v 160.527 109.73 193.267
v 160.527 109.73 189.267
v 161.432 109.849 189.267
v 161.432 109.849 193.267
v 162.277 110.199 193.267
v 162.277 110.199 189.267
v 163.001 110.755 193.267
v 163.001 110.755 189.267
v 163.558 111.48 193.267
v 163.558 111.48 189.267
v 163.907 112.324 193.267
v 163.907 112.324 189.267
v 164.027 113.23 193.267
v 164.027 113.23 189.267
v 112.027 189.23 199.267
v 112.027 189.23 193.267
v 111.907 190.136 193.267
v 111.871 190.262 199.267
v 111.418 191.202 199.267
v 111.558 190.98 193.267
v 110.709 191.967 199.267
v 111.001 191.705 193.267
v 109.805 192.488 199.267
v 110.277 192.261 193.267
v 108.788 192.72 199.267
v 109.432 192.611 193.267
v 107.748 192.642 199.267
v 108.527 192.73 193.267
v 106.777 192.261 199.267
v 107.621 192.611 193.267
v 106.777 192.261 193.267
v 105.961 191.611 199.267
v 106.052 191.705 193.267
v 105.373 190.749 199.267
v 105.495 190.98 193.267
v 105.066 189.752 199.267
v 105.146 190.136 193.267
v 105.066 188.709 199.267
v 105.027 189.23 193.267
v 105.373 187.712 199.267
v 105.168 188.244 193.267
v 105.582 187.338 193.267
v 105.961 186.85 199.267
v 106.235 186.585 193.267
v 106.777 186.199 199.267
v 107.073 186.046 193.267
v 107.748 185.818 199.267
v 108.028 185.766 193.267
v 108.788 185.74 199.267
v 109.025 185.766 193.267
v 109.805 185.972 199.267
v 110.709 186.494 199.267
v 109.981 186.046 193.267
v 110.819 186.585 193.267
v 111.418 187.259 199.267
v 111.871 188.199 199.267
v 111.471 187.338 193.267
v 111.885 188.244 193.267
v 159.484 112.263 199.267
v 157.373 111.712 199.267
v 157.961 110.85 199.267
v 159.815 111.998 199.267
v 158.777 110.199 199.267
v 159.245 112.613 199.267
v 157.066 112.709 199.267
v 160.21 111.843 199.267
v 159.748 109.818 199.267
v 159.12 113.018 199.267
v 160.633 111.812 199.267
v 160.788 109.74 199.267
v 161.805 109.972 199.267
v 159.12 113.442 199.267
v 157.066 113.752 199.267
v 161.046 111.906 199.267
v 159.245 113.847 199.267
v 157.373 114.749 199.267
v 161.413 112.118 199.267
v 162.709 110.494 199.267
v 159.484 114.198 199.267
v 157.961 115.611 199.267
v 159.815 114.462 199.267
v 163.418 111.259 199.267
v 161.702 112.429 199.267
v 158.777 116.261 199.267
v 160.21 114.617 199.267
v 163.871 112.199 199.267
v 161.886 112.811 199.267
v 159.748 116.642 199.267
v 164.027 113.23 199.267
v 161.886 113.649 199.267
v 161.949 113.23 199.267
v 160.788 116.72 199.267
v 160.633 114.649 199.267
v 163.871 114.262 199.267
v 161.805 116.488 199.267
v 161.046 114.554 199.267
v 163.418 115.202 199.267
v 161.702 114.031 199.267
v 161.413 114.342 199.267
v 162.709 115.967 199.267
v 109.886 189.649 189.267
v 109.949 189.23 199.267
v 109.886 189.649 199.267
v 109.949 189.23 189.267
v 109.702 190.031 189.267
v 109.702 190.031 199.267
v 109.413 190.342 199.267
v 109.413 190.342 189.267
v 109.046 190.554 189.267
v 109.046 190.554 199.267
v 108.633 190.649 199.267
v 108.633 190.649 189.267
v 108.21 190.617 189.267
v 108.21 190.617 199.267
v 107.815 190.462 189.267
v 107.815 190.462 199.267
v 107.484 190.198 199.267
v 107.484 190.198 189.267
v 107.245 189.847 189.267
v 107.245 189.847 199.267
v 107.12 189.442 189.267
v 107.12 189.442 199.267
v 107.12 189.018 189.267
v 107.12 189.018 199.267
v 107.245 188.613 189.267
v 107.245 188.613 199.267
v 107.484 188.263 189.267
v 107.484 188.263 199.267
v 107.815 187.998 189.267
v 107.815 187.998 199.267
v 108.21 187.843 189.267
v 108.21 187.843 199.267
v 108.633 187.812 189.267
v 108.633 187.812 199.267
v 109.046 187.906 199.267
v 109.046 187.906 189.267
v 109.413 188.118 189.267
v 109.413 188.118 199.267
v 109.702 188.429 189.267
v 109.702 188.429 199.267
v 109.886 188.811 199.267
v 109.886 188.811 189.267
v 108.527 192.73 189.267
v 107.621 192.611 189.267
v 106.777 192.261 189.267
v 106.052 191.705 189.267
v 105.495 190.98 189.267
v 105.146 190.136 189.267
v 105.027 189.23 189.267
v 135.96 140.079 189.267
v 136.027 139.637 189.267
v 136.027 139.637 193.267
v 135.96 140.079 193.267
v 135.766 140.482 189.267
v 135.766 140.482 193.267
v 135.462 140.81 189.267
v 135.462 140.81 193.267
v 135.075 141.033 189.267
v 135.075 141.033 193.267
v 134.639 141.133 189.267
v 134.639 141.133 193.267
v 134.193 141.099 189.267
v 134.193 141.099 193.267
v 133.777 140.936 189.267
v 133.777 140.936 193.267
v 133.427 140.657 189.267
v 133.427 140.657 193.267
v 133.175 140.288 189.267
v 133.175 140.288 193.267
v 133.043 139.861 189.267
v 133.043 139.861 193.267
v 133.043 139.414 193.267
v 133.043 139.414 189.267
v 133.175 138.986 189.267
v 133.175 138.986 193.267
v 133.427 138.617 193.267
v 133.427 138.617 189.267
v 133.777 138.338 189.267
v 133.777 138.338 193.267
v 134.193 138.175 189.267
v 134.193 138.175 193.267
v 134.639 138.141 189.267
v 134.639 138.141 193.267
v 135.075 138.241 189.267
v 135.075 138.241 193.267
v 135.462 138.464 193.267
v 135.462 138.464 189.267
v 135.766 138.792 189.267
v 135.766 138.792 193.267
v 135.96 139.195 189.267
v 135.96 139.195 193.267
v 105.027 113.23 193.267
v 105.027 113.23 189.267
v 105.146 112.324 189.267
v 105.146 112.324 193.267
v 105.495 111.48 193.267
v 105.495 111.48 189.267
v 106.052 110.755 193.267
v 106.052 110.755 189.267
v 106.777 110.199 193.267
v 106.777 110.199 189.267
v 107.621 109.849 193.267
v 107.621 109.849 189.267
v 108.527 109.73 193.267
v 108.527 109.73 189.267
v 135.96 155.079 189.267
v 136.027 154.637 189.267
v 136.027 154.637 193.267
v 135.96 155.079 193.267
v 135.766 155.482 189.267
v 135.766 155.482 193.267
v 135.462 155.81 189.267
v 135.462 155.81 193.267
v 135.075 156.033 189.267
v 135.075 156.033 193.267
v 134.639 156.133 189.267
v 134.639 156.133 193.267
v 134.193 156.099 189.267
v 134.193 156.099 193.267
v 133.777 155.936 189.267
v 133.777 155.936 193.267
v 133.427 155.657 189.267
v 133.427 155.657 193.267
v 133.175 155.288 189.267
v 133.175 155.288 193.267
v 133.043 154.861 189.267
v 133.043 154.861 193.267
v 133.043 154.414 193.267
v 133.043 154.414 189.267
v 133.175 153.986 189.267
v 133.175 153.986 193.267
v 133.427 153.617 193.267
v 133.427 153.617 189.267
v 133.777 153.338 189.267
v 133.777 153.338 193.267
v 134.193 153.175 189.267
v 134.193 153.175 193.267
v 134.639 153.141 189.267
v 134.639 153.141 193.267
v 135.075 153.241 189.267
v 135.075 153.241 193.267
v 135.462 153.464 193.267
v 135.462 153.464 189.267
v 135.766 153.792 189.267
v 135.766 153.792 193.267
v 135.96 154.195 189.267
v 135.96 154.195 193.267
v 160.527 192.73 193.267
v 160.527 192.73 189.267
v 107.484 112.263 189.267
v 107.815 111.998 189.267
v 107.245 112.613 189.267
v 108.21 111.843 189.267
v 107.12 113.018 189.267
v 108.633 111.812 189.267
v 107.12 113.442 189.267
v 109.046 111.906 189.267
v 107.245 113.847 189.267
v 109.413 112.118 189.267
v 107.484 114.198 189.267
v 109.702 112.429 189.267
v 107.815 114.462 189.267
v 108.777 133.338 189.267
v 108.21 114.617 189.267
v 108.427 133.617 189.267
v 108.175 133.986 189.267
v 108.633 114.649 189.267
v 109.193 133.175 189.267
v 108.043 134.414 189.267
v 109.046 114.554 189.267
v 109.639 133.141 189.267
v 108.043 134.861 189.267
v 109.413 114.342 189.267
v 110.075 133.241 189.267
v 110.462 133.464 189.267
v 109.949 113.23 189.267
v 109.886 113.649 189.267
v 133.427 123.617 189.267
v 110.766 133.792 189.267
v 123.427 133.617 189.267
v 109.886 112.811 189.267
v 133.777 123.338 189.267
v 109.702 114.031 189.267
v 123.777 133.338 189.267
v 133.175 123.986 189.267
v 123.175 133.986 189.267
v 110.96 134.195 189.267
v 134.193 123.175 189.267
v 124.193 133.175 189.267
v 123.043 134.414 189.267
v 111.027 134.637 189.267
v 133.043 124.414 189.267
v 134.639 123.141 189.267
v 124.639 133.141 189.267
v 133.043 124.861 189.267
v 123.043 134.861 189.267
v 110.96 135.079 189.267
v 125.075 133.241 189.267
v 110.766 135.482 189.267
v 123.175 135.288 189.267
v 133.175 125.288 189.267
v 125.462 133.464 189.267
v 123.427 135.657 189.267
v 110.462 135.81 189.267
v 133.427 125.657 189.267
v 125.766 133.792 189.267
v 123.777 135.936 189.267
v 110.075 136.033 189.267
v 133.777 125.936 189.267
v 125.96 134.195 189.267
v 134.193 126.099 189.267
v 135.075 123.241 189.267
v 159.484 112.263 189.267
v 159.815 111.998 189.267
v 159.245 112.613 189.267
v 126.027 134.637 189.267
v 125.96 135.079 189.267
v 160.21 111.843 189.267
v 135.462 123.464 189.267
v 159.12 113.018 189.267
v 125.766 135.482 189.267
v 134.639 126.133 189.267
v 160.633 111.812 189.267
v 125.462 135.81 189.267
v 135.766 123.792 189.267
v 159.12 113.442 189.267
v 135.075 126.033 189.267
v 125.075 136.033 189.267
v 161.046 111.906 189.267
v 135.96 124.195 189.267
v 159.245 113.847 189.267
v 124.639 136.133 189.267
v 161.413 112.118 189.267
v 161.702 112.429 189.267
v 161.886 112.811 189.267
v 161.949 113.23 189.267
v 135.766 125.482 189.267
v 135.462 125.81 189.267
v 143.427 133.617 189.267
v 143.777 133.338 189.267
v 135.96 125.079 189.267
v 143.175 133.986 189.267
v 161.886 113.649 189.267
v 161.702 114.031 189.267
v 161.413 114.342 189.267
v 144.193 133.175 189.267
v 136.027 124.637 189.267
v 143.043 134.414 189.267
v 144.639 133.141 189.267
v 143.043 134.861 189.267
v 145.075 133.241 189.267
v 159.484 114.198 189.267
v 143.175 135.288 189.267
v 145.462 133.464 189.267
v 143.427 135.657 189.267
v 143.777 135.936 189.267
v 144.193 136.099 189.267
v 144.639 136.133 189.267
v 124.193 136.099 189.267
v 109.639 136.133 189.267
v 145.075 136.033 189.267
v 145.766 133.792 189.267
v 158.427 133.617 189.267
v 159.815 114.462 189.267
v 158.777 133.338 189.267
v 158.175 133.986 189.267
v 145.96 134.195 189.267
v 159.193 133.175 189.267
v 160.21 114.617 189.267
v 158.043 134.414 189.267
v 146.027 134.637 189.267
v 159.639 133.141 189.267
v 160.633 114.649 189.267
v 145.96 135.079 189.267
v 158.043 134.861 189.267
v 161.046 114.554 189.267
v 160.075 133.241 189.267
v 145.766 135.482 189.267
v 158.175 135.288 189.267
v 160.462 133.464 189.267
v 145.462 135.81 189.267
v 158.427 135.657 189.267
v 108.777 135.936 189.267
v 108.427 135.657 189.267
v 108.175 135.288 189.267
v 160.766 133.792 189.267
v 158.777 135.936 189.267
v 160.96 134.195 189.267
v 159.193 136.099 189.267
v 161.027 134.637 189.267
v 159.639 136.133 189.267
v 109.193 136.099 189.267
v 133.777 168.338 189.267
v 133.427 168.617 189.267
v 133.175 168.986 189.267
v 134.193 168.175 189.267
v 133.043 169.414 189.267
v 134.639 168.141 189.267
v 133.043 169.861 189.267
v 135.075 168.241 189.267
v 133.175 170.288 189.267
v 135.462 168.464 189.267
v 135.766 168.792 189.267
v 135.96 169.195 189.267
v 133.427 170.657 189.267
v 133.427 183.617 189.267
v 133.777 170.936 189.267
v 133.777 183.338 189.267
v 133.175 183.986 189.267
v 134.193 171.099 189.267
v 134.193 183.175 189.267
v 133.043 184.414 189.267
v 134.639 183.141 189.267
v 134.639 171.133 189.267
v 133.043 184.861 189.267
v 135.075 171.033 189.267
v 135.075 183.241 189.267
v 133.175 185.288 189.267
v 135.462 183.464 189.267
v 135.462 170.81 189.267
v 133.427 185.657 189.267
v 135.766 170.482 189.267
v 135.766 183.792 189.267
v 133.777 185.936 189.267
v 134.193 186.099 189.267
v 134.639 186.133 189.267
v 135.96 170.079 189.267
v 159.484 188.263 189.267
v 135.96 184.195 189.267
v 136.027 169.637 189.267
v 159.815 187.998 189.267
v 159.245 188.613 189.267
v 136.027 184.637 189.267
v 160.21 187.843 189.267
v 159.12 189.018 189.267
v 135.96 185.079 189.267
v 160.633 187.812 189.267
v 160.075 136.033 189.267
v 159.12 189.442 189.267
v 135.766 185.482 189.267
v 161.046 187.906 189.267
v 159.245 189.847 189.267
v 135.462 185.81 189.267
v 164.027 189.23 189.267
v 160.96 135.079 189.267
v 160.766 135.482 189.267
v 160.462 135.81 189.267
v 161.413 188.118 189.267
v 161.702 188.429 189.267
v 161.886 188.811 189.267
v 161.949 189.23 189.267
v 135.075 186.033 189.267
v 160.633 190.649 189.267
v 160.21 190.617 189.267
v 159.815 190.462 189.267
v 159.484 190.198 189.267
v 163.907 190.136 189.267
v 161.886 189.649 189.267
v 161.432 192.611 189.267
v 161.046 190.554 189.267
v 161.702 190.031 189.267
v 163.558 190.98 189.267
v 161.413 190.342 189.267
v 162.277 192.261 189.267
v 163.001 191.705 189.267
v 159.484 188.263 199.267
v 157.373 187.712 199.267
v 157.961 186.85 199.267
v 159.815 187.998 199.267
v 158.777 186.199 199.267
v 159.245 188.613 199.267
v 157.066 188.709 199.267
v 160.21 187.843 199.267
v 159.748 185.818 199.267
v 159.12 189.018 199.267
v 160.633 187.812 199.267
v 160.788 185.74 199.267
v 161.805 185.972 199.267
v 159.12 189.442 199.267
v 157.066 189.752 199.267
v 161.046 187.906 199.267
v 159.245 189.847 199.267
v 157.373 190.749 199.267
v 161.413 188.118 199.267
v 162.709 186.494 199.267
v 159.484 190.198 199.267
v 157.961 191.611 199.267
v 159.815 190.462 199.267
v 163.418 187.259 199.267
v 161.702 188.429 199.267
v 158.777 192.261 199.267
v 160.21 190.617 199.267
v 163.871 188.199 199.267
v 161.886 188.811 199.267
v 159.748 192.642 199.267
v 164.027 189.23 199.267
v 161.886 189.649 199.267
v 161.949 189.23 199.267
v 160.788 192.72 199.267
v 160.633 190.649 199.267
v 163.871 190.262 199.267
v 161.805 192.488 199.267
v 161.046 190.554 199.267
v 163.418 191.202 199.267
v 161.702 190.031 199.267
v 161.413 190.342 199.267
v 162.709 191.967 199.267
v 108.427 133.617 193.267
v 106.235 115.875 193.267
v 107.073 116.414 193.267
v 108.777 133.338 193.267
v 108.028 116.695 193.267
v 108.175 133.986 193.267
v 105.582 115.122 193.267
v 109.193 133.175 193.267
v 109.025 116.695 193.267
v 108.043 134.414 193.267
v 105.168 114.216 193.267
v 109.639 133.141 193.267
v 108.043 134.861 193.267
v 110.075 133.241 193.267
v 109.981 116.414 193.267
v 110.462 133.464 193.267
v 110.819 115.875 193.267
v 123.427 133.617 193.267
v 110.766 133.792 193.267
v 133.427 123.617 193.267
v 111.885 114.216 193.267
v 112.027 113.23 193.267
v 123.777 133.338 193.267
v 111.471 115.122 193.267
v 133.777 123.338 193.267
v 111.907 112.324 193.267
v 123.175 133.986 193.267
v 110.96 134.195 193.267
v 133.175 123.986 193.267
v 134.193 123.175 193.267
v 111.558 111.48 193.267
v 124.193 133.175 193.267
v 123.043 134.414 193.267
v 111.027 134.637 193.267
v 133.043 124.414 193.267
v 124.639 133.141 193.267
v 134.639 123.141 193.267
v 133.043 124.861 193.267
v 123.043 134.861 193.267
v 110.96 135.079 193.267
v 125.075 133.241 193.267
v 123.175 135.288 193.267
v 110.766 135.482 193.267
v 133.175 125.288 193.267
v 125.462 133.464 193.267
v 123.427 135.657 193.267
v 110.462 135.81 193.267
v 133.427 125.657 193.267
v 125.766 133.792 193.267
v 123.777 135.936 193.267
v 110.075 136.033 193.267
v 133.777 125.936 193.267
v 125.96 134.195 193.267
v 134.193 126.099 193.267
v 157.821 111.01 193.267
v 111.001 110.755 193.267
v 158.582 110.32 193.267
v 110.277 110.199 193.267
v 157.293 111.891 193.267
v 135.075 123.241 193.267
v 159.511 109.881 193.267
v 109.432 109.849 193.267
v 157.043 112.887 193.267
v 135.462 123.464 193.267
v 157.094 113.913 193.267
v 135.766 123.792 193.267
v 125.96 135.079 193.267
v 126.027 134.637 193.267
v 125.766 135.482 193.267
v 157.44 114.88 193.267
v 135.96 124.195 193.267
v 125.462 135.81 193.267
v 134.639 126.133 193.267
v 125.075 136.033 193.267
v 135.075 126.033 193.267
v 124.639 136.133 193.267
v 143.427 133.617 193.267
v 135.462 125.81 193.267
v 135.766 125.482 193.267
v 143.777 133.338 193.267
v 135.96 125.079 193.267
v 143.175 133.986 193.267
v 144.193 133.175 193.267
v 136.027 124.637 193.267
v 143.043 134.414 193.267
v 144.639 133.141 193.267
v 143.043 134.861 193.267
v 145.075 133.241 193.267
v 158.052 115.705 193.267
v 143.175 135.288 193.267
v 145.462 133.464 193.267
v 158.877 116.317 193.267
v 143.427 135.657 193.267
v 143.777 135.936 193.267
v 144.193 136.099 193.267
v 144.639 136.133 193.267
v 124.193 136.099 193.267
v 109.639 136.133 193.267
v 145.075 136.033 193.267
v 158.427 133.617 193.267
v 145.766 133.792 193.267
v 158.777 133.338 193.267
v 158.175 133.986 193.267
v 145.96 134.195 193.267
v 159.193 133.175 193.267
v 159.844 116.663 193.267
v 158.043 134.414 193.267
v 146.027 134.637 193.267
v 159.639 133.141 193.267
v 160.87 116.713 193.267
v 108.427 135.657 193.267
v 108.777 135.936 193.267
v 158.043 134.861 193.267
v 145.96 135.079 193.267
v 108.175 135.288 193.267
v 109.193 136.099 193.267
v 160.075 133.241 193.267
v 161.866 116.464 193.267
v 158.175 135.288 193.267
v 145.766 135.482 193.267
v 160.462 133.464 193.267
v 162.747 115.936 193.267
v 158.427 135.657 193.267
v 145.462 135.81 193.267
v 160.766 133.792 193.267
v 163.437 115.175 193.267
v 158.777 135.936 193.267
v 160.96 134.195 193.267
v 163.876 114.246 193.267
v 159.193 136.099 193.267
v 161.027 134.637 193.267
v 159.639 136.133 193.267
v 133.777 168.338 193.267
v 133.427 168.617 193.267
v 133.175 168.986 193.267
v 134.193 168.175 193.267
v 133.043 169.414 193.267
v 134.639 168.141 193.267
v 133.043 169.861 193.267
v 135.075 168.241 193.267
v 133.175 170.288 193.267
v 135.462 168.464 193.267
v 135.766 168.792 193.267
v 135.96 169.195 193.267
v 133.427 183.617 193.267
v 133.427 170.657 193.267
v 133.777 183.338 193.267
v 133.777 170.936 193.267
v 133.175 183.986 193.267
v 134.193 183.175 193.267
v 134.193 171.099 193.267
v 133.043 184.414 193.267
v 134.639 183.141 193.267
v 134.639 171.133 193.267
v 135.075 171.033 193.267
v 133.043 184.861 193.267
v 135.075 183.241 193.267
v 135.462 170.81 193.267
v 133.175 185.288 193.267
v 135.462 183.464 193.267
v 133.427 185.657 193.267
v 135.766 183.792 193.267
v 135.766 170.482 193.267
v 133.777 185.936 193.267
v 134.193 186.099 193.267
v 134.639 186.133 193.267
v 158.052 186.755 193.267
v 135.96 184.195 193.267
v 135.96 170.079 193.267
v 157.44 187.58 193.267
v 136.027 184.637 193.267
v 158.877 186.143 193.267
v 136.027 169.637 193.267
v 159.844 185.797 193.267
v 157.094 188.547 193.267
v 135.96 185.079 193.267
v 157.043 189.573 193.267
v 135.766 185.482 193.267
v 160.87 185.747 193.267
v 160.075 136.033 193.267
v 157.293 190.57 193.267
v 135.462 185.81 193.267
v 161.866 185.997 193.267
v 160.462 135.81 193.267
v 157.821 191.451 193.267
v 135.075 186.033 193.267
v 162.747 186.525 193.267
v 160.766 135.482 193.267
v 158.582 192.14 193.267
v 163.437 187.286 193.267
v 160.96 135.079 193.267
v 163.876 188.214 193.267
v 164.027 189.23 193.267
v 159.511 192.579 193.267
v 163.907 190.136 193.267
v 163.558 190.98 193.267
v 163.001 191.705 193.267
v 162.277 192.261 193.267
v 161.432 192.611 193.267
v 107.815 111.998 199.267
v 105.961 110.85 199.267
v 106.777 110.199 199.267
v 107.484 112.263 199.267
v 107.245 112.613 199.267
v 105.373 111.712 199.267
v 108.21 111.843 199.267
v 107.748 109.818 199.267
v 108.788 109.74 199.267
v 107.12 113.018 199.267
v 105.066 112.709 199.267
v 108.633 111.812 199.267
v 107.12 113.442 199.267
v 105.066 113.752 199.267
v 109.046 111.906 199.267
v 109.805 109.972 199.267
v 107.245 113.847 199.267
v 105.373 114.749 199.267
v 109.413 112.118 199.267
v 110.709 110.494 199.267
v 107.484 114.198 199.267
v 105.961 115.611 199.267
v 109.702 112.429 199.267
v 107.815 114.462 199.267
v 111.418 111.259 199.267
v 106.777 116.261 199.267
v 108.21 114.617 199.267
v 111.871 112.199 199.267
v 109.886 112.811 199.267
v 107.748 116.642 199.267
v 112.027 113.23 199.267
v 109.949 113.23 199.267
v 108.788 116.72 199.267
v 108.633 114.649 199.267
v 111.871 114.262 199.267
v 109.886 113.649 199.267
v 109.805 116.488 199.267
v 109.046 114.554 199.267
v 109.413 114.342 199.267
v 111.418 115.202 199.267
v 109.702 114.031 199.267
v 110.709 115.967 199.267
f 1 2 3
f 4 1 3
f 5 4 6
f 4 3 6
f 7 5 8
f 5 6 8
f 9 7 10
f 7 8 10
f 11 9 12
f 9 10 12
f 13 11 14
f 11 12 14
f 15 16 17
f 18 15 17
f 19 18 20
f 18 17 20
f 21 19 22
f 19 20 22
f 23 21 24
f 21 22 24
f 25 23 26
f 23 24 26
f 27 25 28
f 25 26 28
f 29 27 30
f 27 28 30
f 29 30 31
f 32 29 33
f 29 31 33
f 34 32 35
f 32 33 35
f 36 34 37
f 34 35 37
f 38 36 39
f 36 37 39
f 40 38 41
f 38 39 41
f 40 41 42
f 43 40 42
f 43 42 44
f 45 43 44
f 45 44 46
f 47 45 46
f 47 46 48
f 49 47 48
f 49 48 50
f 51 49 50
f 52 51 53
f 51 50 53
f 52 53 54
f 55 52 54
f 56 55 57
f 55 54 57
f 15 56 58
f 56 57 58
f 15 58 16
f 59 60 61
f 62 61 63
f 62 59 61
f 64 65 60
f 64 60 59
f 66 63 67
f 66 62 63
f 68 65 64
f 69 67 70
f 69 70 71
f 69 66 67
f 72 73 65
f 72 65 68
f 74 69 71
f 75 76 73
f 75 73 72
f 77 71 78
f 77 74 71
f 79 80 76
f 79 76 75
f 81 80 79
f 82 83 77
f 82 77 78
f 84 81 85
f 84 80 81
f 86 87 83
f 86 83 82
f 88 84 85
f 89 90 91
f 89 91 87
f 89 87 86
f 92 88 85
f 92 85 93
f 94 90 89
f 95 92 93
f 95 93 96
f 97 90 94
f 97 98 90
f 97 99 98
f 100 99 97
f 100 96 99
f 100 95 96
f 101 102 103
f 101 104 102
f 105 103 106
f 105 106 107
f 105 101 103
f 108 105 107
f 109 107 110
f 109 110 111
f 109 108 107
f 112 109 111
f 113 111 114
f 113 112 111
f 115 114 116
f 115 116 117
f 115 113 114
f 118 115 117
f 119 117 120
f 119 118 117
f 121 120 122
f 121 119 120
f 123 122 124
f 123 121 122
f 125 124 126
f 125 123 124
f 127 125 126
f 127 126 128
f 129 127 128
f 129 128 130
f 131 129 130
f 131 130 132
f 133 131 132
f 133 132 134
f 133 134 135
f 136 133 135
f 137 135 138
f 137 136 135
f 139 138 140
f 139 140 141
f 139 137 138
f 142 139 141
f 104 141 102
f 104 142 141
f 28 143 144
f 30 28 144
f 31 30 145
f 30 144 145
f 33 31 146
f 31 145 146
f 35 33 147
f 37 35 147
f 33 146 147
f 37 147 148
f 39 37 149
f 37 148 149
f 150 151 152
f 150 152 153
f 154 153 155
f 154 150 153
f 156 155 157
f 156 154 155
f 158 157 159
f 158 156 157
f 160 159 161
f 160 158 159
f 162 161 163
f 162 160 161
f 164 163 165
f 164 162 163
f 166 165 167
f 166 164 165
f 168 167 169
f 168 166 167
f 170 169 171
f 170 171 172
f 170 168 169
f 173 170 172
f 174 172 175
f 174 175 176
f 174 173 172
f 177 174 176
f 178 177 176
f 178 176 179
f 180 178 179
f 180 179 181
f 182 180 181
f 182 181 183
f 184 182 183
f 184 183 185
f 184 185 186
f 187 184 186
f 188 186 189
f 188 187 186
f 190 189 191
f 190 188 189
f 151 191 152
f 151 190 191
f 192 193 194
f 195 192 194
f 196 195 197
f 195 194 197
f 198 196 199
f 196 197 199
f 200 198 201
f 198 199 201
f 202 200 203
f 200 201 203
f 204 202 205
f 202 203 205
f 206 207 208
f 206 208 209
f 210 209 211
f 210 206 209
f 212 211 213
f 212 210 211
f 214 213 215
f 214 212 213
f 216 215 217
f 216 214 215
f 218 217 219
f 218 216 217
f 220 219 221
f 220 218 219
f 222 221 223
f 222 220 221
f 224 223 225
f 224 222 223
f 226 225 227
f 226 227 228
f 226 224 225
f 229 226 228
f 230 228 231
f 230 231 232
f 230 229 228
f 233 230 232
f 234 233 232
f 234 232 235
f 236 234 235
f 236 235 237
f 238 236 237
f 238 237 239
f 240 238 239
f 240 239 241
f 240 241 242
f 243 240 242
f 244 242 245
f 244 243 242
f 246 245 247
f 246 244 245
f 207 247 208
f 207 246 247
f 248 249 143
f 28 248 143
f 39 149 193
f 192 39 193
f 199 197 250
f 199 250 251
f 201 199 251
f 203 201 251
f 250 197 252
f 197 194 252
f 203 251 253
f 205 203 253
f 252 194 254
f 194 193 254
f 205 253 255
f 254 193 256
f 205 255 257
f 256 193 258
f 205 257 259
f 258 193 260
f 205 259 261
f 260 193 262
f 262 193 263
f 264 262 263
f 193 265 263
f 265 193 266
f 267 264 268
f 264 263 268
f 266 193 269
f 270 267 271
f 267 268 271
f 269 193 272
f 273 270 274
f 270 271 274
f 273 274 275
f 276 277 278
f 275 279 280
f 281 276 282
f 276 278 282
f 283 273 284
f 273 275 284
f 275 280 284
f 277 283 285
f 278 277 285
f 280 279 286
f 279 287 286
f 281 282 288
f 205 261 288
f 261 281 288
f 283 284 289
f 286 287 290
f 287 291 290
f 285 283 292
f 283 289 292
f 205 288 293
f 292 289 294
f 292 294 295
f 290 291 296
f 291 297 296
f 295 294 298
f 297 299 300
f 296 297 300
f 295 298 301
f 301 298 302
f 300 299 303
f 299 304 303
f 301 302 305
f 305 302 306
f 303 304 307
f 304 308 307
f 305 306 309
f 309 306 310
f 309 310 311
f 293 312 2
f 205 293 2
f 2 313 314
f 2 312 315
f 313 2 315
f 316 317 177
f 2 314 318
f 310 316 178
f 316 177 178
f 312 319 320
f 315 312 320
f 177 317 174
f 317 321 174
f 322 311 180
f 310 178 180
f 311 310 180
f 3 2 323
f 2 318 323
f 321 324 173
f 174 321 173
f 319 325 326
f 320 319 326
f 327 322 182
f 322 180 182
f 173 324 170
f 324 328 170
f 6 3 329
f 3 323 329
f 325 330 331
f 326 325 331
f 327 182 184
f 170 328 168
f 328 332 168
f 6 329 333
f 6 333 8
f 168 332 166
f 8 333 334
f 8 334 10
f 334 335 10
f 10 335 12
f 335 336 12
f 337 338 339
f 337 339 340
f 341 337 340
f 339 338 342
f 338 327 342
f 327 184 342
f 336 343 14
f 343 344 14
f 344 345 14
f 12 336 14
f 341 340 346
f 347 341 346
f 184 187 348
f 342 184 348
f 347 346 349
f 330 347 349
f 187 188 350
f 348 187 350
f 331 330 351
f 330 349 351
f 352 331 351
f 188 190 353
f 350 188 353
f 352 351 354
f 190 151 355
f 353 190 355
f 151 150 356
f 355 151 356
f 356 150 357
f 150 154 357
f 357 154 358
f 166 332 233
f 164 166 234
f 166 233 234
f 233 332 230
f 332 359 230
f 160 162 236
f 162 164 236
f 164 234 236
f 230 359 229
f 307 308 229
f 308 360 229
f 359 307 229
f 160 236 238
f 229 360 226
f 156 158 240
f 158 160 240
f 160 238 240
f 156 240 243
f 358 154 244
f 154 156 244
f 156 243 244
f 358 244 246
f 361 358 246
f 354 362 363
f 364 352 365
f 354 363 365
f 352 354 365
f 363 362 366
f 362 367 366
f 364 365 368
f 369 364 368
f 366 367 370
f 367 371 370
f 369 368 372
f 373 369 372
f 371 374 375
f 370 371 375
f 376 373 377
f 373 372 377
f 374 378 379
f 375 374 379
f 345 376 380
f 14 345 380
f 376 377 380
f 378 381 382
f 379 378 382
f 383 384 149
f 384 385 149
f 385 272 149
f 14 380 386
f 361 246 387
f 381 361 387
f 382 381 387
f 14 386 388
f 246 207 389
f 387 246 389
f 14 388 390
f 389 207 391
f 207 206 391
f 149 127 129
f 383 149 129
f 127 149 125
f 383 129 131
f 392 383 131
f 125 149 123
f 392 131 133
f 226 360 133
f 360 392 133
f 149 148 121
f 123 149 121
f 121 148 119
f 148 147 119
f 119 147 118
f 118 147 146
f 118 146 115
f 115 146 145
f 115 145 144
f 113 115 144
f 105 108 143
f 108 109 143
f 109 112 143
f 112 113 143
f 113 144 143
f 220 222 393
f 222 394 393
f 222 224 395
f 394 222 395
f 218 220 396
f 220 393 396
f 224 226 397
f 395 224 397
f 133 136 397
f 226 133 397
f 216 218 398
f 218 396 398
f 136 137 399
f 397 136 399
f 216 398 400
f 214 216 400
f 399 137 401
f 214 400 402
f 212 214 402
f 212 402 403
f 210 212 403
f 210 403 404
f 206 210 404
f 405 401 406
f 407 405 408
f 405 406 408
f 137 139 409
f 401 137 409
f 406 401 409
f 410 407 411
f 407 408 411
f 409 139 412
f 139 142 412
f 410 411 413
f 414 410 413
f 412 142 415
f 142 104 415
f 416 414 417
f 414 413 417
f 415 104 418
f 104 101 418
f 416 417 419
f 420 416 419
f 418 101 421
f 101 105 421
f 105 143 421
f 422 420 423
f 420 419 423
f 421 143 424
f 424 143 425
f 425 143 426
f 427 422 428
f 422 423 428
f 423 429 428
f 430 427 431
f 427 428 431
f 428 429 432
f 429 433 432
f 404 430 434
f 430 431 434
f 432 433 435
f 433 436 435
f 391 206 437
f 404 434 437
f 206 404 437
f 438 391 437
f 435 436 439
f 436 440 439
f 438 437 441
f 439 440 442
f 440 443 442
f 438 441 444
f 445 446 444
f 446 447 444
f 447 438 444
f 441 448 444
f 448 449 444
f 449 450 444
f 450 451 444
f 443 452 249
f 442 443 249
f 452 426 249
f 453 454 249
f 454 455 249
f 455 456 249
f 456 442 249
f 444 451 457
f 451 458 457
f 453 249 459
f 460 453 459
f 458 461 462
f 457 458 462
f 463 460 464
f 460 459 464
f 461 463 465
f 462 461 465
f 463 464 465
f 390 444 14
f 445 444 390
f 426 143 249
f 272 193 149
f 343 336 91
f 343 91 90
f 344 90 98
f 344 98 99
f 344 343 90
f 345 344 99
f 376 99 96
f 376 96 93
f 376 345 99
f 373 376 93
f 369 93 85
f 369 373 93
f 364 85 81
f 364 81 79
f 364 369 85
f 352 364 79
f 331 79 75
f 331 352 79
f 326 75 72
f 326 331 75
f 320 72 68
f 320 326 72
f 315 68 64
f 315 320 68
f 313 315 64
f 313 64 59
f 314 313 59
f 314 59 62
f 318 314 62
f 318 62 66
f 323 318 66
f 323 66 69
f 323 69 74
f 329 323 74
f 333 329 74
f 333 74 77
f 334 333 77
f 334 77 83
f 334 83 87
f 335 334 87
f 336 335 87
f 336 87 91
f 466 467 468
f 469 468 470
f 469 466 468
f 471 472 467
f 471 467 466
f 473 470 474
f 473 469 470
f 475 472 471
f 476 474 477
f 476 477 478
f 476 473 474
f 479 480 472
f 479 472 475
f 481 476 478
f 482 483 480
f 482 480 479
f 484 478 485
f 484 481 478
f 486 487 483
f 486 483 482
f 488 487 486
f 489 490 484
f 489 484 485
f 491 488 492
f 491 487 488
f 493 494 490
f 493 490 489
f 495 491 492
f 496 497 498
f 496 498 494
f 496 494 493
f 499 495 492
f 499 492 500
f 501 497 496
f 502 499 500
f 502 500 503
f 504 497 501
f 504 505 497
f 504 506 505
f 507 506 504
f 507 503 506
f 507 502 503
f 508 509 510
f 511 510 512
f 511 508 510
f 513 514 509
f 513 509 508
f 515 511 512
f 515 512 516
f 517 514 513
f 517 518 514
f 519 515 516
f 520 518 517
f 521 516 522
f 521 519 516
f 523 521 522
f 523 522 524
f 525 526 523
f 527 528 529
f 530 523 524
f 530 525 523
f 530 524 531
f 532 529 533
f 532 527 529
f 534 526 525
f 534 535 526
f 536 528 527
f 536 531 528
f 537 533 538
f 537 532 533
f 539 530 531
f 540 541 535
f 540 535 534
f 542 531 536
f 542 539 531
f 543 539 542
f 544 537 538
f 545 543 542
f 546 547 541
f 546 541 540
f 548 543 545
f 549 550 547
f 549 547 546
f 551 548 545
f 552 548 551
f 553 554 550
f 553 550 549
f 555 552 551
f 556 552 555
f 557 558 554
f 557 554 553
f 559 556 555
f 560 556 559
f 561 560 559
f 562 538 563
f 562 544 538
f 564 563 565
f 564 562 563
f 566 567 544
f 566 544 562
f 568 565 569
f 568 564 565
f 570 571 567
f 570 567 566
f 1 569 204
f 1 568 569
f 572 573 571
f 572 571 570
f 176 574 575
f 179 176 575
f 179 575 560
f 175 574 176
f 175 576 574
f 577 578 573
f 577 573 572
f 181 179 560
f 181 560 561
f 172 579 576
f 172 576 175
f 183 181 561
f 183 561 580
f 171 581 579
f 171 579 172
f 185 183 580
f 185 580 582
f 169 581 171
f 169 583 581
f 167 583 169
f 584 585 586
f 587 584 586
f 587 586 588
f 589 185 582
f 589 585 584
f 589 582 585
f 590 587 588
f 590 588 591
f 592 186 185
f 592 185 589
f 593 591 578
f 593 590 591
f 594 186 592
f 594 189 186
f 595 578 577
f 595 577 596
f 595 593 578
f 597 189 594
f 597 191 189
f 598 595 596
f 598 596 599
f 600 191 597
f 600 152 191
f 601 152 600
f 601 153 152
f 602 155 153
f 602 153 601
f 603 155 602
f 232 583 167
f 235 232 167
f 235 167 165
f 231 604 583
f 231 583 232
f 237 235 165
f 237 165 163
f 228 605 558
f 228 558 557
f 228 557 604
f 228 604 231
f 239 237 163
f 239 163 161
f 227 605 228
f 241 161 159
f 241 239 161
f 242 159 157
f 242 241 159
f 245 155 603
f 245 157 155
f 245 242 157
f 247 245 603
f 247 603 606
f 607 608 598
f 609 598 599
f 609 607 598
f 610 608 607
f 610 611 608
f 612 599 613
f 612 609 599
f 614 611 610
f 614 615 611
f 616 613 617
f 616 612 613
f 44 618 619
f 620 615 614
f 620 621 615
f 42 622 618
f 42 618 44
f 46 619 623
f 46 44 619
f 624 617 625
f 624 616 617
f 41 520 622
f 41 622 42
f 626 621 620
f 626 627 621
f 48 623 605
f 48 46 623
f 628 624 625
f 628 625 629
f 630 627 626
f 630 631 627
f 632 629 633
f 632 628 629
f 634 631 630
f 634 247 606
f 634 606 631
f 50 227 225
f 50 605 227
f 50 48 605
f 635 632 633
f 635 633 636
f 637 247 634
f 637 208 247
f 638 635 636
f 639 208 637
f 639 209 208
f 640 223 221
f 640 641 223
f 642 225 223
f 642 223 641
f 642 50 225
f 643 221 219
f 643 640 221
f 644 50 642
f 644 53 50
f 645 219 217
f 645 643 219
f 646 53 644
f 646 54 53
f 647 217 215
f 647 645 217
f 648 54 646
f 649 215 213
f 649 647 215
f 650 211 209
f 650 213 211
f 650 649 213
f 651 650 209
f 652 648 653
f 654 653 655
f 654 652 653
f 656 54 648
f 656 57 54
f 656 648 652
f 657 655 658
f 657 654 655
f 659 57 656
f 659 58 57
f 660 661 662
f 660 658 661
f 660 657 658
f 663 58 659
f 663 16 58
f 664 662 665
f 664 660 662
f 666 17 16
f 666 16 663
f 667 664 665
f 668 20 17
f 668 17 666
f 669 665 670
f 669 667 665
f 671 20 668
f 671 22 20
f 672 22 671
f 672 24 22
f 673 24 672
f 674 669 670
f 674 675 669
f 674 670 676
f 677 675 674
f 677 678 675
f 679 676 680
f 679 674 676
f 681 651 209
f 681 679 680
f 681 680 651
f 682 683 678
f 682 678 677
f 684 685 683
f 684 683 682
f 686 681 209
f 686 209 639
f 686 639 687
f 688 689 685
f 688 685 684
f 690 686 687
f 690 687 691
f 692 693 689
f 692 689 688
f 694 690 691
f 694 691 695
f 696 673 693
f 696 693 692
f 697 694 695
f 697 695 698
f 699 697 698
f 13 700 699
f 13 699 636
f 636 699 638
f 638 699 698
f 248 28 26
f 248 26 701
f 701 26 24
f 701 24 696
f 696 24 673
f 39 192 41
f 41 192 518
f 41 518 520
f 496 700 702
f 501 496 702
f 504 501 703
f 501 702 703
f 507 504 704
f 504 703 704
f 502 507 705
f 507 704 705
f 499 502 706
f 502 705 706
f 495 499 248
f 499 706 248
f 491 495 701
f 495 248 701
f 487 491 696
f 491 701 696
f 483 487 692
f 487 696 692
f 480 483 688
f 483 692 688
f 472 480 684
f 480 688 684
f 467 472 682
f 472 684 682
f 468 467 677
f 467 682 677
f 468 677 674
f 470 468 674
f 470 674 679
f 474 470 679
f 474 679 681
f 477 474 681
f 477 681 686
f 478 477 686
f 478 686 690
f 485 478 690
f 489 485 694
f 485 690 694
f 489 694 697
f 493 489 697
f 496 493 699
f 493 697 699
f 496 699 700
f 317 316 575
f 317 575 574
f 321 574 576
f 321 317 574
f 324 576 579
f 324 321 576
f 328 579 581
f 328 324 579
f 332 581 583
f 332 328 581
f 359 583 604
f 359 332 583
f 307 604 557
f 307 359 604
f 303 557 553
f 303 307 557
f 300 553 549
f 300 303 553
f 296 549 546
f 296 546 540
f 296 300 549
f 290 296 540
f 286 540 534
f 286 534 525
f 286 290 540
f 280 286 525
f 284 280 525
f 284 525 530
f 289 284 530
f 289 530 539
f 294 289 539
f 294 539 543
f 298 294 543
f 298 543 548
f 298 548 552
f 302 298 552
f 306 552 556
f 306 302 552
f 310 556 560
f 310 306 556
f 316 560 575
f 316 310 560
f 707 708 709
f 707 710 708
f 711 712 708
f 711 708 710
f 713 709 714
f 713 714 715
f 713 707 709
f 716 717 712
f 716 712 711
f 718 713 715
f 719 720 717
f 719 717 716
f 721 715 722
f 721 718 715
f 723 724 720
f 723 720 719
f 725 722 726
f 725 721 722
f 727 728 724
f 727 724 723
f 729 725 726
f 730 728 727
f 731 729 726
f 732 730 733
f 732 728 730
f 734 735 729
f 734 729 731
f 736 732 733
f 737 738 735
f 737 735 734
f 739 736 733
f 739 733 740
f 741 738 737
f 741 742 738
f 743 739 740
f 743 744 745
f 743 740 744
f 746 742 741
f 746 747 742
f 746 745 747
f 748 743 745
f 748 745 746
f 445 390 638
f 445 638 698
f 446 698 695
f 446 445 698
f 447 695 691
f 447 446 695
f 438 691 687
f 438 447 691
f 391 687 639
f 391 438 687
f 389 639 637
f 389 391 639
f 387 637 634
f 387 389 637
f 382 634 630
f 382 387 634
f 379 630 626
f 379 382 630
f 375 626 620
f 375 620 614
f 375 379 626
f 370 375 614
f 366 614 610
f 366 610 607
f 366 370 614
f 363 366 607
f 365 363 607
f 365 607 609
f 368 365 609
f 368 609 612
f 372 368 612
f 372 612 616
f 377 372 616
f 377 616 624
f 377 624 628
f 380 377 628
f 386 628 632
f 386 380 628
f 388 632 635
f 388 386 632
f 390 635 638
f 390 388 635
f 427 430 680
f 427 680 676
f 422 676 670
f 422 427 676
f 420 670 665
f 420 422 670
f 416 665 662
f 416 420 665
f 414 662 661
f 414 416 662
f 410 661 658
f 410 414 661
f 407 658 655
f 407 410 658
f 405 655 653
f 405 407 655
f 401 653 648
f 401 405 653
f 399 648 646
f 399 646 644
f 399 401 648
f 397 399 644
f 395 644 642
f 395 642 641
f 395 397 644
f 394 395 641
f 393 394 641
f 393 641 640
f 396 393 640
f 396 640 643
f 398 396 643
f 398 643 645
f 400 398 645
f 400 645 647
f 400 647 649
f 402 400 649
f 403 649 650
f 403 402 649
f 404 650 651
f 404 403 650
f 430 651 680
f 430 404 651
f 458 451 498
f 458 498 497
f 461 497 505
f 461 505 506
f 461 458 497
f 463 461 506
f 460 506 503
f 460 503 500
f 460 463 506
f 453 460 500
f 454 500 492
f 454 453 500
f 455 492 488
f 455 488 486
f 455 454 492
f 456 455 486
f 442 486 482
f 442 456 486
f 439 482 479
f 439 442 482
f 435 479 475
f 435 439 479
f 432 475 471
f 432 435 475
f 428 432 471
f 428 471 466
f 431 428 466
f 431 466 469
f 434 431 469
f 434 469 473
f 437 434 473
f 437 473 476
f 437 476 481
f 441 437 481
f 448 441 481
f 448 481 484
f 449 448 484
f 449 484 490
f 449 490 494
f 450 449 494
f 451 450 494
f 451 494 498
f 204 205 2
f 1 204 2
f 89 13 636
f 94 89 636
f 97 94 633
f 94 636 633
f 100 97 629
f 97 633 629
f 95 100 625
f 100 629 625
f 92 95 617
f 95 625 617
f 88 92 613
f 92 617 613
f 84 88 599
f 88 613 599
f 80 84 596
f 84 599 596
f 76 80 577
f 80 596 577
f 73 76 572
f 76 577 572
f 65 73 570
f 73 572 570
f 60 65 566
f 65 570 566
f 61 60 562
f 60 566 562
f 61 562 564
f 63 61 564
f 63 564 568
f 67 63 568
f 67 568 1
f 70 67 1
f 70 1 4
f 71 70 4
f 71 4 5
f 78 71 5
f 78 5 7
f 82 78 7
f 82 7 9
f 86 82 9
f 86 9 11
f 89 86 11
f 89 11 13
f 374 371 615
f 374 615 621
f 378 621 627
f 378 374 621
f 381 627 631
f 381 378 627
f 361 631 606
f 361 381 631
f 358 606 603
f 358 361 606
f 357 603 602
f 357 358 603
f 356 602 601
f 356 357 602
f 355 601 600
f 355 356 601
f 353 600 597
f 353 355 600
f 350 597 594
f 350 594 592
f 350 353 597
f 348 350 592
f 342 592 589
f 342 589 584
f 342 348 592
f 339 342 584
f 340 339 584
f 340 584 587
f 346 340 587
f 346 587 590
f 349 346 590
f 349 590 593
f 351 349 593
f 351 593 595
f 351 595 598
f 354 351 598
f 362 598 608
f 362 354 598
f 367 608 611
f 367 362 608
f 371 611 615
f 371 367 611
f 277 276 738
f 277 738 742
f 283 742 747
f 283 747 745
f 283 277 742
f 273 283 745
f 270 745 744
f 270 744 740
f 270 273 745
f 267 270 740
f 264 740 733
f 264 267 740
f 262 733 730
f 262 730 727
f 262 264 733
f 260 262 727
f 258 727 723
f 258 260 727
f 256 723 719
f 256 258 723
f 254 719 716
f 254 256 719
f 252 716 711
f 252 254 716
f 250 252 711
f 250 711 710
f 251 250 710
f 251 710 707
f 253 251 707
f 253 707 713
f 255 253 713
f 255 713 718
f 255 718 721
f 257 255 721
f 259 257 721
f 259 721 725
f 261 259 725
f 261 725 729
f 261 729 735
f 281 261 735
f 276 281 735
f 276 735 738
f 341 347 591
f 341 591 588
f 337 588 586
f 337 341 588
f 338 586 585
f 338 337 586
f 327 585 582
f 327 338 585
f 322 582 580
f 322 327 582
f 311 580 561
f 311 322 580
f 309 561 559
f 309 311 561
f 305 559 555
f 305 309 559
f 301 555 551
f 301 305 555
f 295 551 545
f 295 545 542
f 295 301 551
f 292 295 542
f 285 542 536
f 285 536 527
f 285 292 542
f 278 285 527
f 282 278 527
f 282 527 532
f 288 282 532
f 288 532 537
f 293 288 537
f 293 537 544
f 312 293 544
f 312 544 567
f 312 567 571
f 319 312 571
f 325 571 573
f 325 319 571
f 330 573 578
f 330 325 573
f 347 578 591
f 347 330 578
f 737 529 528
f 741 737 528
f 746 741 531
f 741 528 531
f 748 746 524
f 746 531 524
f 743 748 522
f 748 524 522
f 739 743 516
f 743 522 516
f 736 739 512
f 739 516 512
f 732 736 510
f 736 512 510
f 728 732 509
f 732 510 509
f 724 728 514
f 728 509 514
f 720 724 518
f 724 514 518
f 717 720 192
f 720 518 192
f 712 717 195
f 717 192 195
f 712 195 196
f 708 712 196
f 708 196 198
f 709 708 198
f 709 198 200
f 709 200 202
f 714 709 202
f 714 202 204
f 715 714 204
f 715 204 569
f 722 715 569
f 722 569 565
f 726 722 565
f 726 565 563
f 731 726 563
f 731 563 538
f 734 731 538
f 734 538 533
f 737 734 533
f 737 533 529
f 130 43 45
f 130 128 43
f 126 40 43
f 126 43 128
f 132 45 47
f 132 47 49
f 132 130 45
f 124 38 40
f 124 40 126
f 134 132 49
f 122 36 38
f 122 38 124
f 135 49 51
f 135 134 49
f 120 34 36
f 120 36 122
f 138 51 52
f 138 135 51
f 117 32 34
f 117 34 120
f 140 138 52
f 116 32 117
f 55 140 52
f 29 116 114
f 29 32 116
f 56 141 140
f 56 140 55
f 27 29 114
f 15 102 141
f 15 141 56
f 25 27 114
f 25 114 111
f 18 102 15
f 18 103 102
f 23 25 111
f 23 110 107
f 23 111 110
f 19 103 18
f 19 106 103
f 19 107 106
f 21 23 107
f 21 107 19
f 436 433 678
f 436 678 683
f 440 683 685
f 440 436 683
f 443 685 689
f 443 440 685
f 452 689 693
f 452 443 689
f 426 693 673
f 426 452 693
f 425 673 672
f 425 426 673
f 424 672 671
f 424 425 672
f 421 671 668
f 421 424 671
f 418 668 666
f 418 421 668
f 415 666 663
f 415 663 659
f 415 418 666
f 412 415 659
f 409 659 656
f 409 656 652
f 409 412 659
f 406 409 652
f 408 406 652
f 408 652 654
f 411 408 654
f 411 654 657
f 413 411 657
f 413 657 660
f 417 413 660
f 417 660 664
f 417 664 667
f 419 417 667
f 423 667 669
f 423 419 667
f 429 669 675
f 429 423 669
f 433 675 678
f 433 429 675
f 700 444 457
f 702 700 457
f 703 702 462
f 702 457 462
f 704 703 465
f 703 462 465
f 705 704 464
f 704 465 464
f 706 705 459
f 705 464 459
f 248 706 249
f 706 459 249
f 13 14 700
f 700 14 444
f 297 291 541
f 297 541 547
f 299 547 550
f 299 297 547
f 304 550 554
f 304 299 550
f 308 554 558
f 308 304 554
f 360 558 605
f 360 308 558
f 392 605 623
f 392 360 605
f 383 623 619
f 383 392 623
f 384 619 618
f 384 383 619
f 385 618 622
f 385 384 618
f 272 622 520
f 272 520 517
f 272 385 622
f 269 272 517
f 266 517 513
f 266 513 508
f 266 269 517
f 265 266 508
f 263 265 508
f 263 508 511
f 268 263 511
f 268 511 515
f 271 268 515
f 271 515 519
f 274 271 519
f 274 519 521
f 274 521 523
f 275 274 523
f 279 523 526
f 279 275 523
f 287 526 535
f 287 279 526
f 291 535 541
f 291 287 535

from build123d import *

# Parameters (mm, degrees)
SKETCH1_R           = 1.5
SKETCH1_R_2         = 1.4224
BOSS_EXTRUDE1_DEPTH = 4
SKETCH2_R           = 3.5
SKETCH2_R_2         = 1.4224
BOSS_EXTRUDE2_DEPTH = 6


with BuildPart() as part:
    # Sketch1 → Boss-Extrude1 (new body)
    with BuildSketch(Plane.XY.offset(189.266714263)):
        with BuildLine():
            Line((108.526557277, 109.730165261), (160.526557277, 109.730165261))
            ThreePointArc((160.526557277, 109.730165261), (163.001431011, 110.755291526), (164.026557277, 113.230165261))
            Line((164.026557277, 113.230165261), (164.026557277, 189.230165261))
            ThreePointArc((164.026557277, 189.230165261), (163.001431011, 191.705038995), (160.526557277, 192.730165261))
            Line((160.526557277, 192.730165261), (108.526557277, 192.730165261))
            ThreePointArc((108.526557277, 192.730165261), (106.051683543, 191.705038995), (105.026557277, 189.230165261))
            Line((105.026557277, 189.230165261), (105.026557277, 113.230165261))
            ThreePointArc((105.026557277, 113.230165261), (106.051683543, 110.755291526), (108.526557277, 109.730165261))
        make_face()
        with Locations((134.526557277, 124.637085275)):
            Circle(SKETCH1_R, mode=Mode.SUBTRACT)
        with Locations((109.526557277, 134.637085275)):
            Circle(SKETCH1_R, mode=Mode.SUBTRACT)
        with Locations((124.526557277, 134.637085275)):
            Circle(SKETCH1_R, mode=Mode.SUBTRACT)
        with Locations((159.526557277, 134.637085275)):
            Circle(SKETCH1_R, mode=Mode.SUBTRACT)
        with Locations((144.526557277, 134.637085275)):
            Circle(SKETCH1_R, mode=Mode.SUBTRACT)
        with Locations((134.526557277, 139.637085275)):
            Circle(SKETCH1_R, mode=Mode.SUBTRACT)
        with Locations((134.526557277, 154.637085275)):
            Circle(SKETCH1_R, mode=Mode.SUBTRACT)
        with Locations((134.526557277, 169.637085275)):
            Circle(SKETCH1_R, mode=Mode.SUBTRACT)
        with Locations((134.526557277, 184.637085275)):
            Circle(SKETCH1_R, mode=Mode.SUBTRACT)
        with Locations((108.526557277, 189.230165261)):
            Circle(SKETCH1_R_2, mode=Mode.SUBTRACT)
        with Locations((160.526557277, 189.230165261)):
            Circle(SKETCH1_R_2, mode=Mode.SUBTRACT)
        with Locations((160.526557277, 113.230165261)):
            Circle(SKETCH1_R_2, mode=Mode.SUBTRACT)
        with Locations((108.526557277, 113.230165261)):
            Circle(SKETCH1_R_2, mode=Mode.SUBTRACT)
    extrude(amount=BOSS_EXTRUDE1_DEPTH)

    # Sketch2 → Boss-Extrude2 (add)
    with BuildSketch(Plane.XY.offset(193.266714263)):
        with Locations((108.526557277, 189.230165261)):
            Circle(SKETCH2_R)
        with Locations((108.526557277, 189.230165261)):
            Circle(SKETCH2_R_2, mode=Mode.SUBTRACT)
        with Locations((160.526557277, 189.230165261)):
            Circle(SKETCH2_R)
        with Locations((160.526557277, 189.230165261)):
            Circle(SKETCH2_R_2, mode=Mode.SUBTRACT)
        with Locations((108.526557277, 113.230165261)):
            Circle(SKETCH2_R)
        with Locations((108.526557277, 113.230165261)):
            Circle(SKETCH2_R_2, mode=Mode.SUBTRACT)
        with Locations((160.526557277, 113.230165261)):
            Circle(SKETCH2_R)
        with Locations((160.526557277, 113.230165261)):
            Circle(SKETCH2_R_2, mode=Mode.SUBTRACT)
    extrude(amount=BOSS_EXTRUDE2_DEPTH)


solid = part.part
